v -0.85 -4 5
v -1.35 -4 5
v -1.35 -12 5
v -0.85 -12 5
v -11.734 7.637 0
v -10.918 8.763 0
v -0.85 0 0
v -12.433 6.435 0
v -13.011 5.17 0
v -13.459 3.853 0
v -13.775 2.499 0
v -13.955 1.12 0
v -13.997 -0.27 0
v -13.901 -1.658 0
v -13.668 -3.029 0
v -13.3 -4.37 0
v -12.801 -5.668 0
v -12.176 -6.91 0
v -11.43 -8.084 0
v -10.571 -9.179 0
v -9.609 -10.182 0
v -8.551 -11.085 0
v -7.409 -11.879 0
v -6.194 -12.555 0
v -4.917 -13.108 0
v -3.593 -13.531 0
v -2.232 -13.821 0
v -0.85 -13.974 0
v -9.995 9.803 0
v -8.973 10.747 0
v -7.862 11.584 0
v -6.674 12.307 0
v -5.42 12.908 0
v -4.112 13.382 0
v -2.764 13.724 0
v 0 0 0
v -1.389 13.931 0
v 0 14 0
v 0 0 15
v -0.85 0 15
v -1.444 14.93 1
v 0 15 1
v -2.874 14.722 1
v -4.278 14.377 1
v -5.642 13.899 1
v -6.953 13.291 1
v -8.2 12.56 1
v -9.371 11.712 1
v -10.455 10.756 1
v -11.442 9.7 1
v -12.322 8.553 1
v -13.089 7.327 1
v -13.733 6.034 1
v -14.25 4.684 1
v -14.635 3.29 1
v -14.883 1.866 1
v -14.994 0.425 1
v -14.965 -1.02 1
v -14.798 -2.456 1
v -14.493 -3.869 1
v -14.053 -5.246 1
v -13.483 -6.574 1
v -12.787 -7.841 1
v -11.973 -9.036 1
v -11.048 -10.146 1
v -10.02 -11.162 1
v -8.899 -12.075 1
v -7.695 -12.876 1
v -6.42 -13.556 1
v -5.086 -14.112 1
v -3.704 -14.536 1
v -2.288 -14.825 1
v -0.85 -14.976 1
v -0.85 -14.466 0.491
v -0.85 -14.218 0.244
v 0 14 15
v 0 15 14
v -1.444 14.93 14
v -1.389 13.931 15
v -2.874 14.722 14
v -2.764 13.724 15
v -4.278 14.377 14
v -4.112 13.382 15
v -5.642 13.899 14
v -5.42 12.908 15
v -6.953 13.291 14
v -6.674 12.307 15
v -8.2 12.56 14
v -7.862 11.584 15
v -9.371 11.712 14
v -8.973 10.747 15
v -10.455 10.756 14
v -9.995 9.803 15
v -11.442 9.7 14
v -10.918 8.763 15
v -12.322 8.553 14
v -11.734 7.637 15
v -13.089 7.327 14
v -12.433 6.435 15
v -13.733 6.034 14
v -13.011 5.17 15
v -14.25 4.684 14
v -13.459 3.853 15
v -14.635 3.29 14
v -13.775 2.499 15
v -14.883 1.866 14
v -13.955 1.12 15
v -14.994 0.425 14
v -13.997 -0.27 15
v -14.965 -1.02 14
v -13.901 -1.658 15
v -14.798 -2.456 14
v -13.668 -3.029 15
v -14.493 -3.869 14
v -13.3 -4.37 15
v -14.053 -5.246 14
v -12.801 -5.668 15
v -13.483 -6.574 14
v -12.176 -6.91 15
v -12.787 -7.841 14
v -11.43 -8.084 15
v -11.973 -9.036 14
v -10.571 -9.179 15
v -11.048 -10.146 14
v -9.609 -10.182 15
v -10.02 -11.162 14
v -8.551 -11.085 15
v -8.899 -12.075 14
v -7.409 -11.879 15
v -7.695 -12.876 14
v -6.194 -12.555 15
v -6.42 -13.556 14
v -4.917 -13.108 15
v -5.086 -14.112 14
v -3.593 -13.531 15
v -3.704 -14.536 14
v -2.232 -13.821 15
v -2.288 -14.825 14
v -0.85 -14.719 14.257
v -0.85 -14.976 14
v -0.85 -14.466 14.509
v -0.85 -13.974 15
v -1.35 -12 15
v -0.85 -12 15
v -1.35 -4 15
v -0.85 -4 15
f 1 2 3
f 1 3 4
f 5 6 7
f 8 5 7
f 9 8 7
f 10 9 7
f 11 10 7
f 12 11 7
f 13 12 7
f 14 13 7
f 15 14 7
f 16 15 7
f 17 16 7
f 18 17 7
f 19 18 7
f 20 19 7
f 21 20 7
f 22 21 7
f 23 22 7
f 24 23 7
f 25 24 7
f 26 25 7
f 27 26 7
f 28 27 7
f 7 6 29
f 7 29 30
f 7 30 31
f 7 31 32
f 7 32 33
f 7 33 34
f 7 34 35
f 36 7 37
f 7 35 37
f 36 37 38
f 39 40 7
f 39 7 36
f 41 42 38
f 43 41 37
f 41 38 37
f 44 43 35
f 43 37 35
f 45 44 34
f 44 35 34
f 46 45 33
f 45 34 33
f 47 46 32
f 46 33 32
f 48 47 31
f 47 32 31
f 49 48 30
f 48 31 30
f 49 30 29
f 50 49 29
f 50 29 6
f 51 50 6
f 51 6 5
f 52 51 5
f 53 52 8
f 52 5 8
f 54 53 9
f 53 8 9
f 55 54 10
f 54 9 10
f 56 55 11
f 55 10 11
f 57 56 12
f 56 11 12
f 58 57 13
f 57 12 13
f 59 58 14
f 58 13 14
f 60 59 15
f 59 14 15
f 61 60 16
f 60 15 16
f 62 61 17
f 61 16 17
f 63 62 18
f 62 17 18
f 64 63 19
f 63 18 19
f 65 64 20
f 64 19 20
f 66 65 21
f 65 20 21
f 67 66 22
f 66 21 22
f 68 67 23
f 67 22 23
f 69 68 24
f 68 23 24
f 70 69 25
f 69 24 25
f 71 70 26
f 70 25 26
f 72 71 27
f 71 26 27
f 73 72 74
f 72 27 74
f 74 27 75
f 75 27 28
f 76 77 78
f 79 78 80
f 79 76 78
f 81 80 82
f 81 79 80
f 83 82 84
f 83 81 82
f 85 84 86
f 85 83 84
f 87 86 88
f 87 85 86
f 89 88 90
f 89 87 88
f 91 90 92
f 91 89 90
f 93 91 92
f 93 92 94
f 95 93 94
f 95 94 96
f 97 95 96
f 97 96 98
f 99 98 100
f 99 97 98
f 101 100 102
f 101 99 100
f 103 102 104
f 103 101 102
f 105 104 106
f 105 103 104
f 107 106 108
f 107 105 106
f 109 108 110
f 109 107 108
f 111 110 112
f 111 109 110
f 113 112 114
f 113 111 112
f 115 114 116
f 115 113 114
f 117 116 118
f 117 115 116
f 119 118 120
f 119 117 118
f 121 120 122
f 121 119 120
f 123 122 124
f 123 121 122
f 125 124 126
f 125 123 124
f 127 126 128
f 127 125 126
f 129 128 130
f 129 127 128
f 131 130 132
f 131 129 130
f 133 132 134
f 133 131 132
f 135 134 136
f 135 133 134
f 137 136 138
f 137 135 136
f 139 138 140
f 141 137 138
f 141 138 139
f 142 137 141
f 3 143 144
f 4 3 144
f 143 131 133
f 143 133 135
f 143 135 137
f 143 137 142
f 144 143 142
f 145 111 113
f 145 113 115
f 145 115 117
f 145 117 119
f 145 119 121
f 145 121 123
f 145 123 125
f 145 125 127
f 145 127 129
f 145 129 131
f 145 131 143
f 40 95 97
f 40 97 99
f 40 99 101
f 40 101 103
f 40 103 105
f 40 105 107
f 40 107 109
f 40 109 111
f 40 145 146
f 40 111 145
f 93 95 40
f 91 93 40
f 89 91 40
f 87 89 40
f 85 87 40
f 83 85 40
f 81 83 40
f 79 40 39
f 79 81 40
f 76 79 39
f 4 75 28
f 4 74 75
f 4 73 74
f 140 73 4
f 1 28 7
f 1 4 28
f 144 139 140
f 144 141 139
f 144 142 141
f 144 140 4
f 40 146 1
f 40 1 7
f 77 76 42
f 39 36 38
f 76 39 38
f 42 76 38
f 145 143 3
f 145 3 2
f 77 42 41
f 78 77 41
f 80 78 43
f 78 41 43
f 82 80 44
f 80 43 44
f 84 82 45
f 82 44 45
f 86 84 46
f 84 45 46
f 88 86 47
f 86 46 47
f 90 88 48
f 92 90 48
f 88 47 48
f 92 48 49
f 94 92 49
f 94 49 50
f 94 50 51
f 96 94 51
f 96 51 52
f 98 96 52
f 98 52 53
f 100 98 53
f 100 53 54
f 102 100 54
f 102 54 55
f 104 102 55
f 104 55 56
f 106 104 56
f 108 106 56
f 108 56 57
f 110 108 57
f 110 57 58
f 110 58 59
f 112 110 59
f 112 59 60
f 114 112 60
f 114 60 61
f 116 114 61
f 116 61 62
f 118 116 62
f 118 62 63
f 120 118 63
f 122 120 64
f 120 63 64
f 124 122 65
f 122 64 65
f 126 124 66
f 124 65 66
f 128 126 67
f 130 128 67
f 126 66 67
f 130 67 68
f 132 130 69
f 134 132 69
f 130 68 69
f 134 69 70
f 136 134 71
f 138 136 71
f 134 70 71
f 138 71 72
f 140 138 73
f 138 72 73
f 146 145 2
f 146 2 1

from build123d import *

# Parameters (mm, degrees)
F0_W     = 0.6
F0_H     = 8
F1_DEPTH = 15
F2_SIZE  = 1
F3_W     = 0.85
F3_H     = 15.628527
F4_DEPTH = 25
F5_W     = 0.5
F5_H     = 8
F6_DEPTH = 10


with BuildPart() as f1:
    # F0 (on Top) → F1 (new body)
    with BuildSketch(Plane.XY):
        with BuildLine():
            Line((0, -4), (0, 15))
            ThreePointArc((0, 15), (-15, 0), (0, -15))
            Line((0, -15), (0, -12))
            Line((0, -12), (-0.6, -12))
            Line((-0.6, -12), (-0.6, -4))
            Line((-0.6, -4), (0, -4))
        make_face()
        with Locations((-0.3, -8)):
            Rectangle(F0_W, F0_H)
    extrude(amount=F1_DEPTH)

    # F2
    f2_edges = [f1.edges().sort_by_distance(p)[0] for p in [
        (-15, 0, 15),
        (-15, 0, 0),
    ]]
    chamfer(f2_edges, length=F2_SIZE)

    # F3 (on face) → F4 (cut)
    with BuildSketch(Plane.XY.offset(15)):
        with Locations((-0.425, -7.814656)):
            Rectangle(F3_W, F3_H)
    extrude(amount=-F4_DEPTH, mode=Mode.SUBTRACT)

    # F5 (on face) → F6 (cut)
    with BuildSketch(Plane.XY.offset(15)):
        with Locations((-1.1, -8.000393)):
            Rectangle(F5_W, F5_H)
    extrude(amount=-F6_DEPTH, mode=Mode.SUBTRACT)


solid = f1.part
